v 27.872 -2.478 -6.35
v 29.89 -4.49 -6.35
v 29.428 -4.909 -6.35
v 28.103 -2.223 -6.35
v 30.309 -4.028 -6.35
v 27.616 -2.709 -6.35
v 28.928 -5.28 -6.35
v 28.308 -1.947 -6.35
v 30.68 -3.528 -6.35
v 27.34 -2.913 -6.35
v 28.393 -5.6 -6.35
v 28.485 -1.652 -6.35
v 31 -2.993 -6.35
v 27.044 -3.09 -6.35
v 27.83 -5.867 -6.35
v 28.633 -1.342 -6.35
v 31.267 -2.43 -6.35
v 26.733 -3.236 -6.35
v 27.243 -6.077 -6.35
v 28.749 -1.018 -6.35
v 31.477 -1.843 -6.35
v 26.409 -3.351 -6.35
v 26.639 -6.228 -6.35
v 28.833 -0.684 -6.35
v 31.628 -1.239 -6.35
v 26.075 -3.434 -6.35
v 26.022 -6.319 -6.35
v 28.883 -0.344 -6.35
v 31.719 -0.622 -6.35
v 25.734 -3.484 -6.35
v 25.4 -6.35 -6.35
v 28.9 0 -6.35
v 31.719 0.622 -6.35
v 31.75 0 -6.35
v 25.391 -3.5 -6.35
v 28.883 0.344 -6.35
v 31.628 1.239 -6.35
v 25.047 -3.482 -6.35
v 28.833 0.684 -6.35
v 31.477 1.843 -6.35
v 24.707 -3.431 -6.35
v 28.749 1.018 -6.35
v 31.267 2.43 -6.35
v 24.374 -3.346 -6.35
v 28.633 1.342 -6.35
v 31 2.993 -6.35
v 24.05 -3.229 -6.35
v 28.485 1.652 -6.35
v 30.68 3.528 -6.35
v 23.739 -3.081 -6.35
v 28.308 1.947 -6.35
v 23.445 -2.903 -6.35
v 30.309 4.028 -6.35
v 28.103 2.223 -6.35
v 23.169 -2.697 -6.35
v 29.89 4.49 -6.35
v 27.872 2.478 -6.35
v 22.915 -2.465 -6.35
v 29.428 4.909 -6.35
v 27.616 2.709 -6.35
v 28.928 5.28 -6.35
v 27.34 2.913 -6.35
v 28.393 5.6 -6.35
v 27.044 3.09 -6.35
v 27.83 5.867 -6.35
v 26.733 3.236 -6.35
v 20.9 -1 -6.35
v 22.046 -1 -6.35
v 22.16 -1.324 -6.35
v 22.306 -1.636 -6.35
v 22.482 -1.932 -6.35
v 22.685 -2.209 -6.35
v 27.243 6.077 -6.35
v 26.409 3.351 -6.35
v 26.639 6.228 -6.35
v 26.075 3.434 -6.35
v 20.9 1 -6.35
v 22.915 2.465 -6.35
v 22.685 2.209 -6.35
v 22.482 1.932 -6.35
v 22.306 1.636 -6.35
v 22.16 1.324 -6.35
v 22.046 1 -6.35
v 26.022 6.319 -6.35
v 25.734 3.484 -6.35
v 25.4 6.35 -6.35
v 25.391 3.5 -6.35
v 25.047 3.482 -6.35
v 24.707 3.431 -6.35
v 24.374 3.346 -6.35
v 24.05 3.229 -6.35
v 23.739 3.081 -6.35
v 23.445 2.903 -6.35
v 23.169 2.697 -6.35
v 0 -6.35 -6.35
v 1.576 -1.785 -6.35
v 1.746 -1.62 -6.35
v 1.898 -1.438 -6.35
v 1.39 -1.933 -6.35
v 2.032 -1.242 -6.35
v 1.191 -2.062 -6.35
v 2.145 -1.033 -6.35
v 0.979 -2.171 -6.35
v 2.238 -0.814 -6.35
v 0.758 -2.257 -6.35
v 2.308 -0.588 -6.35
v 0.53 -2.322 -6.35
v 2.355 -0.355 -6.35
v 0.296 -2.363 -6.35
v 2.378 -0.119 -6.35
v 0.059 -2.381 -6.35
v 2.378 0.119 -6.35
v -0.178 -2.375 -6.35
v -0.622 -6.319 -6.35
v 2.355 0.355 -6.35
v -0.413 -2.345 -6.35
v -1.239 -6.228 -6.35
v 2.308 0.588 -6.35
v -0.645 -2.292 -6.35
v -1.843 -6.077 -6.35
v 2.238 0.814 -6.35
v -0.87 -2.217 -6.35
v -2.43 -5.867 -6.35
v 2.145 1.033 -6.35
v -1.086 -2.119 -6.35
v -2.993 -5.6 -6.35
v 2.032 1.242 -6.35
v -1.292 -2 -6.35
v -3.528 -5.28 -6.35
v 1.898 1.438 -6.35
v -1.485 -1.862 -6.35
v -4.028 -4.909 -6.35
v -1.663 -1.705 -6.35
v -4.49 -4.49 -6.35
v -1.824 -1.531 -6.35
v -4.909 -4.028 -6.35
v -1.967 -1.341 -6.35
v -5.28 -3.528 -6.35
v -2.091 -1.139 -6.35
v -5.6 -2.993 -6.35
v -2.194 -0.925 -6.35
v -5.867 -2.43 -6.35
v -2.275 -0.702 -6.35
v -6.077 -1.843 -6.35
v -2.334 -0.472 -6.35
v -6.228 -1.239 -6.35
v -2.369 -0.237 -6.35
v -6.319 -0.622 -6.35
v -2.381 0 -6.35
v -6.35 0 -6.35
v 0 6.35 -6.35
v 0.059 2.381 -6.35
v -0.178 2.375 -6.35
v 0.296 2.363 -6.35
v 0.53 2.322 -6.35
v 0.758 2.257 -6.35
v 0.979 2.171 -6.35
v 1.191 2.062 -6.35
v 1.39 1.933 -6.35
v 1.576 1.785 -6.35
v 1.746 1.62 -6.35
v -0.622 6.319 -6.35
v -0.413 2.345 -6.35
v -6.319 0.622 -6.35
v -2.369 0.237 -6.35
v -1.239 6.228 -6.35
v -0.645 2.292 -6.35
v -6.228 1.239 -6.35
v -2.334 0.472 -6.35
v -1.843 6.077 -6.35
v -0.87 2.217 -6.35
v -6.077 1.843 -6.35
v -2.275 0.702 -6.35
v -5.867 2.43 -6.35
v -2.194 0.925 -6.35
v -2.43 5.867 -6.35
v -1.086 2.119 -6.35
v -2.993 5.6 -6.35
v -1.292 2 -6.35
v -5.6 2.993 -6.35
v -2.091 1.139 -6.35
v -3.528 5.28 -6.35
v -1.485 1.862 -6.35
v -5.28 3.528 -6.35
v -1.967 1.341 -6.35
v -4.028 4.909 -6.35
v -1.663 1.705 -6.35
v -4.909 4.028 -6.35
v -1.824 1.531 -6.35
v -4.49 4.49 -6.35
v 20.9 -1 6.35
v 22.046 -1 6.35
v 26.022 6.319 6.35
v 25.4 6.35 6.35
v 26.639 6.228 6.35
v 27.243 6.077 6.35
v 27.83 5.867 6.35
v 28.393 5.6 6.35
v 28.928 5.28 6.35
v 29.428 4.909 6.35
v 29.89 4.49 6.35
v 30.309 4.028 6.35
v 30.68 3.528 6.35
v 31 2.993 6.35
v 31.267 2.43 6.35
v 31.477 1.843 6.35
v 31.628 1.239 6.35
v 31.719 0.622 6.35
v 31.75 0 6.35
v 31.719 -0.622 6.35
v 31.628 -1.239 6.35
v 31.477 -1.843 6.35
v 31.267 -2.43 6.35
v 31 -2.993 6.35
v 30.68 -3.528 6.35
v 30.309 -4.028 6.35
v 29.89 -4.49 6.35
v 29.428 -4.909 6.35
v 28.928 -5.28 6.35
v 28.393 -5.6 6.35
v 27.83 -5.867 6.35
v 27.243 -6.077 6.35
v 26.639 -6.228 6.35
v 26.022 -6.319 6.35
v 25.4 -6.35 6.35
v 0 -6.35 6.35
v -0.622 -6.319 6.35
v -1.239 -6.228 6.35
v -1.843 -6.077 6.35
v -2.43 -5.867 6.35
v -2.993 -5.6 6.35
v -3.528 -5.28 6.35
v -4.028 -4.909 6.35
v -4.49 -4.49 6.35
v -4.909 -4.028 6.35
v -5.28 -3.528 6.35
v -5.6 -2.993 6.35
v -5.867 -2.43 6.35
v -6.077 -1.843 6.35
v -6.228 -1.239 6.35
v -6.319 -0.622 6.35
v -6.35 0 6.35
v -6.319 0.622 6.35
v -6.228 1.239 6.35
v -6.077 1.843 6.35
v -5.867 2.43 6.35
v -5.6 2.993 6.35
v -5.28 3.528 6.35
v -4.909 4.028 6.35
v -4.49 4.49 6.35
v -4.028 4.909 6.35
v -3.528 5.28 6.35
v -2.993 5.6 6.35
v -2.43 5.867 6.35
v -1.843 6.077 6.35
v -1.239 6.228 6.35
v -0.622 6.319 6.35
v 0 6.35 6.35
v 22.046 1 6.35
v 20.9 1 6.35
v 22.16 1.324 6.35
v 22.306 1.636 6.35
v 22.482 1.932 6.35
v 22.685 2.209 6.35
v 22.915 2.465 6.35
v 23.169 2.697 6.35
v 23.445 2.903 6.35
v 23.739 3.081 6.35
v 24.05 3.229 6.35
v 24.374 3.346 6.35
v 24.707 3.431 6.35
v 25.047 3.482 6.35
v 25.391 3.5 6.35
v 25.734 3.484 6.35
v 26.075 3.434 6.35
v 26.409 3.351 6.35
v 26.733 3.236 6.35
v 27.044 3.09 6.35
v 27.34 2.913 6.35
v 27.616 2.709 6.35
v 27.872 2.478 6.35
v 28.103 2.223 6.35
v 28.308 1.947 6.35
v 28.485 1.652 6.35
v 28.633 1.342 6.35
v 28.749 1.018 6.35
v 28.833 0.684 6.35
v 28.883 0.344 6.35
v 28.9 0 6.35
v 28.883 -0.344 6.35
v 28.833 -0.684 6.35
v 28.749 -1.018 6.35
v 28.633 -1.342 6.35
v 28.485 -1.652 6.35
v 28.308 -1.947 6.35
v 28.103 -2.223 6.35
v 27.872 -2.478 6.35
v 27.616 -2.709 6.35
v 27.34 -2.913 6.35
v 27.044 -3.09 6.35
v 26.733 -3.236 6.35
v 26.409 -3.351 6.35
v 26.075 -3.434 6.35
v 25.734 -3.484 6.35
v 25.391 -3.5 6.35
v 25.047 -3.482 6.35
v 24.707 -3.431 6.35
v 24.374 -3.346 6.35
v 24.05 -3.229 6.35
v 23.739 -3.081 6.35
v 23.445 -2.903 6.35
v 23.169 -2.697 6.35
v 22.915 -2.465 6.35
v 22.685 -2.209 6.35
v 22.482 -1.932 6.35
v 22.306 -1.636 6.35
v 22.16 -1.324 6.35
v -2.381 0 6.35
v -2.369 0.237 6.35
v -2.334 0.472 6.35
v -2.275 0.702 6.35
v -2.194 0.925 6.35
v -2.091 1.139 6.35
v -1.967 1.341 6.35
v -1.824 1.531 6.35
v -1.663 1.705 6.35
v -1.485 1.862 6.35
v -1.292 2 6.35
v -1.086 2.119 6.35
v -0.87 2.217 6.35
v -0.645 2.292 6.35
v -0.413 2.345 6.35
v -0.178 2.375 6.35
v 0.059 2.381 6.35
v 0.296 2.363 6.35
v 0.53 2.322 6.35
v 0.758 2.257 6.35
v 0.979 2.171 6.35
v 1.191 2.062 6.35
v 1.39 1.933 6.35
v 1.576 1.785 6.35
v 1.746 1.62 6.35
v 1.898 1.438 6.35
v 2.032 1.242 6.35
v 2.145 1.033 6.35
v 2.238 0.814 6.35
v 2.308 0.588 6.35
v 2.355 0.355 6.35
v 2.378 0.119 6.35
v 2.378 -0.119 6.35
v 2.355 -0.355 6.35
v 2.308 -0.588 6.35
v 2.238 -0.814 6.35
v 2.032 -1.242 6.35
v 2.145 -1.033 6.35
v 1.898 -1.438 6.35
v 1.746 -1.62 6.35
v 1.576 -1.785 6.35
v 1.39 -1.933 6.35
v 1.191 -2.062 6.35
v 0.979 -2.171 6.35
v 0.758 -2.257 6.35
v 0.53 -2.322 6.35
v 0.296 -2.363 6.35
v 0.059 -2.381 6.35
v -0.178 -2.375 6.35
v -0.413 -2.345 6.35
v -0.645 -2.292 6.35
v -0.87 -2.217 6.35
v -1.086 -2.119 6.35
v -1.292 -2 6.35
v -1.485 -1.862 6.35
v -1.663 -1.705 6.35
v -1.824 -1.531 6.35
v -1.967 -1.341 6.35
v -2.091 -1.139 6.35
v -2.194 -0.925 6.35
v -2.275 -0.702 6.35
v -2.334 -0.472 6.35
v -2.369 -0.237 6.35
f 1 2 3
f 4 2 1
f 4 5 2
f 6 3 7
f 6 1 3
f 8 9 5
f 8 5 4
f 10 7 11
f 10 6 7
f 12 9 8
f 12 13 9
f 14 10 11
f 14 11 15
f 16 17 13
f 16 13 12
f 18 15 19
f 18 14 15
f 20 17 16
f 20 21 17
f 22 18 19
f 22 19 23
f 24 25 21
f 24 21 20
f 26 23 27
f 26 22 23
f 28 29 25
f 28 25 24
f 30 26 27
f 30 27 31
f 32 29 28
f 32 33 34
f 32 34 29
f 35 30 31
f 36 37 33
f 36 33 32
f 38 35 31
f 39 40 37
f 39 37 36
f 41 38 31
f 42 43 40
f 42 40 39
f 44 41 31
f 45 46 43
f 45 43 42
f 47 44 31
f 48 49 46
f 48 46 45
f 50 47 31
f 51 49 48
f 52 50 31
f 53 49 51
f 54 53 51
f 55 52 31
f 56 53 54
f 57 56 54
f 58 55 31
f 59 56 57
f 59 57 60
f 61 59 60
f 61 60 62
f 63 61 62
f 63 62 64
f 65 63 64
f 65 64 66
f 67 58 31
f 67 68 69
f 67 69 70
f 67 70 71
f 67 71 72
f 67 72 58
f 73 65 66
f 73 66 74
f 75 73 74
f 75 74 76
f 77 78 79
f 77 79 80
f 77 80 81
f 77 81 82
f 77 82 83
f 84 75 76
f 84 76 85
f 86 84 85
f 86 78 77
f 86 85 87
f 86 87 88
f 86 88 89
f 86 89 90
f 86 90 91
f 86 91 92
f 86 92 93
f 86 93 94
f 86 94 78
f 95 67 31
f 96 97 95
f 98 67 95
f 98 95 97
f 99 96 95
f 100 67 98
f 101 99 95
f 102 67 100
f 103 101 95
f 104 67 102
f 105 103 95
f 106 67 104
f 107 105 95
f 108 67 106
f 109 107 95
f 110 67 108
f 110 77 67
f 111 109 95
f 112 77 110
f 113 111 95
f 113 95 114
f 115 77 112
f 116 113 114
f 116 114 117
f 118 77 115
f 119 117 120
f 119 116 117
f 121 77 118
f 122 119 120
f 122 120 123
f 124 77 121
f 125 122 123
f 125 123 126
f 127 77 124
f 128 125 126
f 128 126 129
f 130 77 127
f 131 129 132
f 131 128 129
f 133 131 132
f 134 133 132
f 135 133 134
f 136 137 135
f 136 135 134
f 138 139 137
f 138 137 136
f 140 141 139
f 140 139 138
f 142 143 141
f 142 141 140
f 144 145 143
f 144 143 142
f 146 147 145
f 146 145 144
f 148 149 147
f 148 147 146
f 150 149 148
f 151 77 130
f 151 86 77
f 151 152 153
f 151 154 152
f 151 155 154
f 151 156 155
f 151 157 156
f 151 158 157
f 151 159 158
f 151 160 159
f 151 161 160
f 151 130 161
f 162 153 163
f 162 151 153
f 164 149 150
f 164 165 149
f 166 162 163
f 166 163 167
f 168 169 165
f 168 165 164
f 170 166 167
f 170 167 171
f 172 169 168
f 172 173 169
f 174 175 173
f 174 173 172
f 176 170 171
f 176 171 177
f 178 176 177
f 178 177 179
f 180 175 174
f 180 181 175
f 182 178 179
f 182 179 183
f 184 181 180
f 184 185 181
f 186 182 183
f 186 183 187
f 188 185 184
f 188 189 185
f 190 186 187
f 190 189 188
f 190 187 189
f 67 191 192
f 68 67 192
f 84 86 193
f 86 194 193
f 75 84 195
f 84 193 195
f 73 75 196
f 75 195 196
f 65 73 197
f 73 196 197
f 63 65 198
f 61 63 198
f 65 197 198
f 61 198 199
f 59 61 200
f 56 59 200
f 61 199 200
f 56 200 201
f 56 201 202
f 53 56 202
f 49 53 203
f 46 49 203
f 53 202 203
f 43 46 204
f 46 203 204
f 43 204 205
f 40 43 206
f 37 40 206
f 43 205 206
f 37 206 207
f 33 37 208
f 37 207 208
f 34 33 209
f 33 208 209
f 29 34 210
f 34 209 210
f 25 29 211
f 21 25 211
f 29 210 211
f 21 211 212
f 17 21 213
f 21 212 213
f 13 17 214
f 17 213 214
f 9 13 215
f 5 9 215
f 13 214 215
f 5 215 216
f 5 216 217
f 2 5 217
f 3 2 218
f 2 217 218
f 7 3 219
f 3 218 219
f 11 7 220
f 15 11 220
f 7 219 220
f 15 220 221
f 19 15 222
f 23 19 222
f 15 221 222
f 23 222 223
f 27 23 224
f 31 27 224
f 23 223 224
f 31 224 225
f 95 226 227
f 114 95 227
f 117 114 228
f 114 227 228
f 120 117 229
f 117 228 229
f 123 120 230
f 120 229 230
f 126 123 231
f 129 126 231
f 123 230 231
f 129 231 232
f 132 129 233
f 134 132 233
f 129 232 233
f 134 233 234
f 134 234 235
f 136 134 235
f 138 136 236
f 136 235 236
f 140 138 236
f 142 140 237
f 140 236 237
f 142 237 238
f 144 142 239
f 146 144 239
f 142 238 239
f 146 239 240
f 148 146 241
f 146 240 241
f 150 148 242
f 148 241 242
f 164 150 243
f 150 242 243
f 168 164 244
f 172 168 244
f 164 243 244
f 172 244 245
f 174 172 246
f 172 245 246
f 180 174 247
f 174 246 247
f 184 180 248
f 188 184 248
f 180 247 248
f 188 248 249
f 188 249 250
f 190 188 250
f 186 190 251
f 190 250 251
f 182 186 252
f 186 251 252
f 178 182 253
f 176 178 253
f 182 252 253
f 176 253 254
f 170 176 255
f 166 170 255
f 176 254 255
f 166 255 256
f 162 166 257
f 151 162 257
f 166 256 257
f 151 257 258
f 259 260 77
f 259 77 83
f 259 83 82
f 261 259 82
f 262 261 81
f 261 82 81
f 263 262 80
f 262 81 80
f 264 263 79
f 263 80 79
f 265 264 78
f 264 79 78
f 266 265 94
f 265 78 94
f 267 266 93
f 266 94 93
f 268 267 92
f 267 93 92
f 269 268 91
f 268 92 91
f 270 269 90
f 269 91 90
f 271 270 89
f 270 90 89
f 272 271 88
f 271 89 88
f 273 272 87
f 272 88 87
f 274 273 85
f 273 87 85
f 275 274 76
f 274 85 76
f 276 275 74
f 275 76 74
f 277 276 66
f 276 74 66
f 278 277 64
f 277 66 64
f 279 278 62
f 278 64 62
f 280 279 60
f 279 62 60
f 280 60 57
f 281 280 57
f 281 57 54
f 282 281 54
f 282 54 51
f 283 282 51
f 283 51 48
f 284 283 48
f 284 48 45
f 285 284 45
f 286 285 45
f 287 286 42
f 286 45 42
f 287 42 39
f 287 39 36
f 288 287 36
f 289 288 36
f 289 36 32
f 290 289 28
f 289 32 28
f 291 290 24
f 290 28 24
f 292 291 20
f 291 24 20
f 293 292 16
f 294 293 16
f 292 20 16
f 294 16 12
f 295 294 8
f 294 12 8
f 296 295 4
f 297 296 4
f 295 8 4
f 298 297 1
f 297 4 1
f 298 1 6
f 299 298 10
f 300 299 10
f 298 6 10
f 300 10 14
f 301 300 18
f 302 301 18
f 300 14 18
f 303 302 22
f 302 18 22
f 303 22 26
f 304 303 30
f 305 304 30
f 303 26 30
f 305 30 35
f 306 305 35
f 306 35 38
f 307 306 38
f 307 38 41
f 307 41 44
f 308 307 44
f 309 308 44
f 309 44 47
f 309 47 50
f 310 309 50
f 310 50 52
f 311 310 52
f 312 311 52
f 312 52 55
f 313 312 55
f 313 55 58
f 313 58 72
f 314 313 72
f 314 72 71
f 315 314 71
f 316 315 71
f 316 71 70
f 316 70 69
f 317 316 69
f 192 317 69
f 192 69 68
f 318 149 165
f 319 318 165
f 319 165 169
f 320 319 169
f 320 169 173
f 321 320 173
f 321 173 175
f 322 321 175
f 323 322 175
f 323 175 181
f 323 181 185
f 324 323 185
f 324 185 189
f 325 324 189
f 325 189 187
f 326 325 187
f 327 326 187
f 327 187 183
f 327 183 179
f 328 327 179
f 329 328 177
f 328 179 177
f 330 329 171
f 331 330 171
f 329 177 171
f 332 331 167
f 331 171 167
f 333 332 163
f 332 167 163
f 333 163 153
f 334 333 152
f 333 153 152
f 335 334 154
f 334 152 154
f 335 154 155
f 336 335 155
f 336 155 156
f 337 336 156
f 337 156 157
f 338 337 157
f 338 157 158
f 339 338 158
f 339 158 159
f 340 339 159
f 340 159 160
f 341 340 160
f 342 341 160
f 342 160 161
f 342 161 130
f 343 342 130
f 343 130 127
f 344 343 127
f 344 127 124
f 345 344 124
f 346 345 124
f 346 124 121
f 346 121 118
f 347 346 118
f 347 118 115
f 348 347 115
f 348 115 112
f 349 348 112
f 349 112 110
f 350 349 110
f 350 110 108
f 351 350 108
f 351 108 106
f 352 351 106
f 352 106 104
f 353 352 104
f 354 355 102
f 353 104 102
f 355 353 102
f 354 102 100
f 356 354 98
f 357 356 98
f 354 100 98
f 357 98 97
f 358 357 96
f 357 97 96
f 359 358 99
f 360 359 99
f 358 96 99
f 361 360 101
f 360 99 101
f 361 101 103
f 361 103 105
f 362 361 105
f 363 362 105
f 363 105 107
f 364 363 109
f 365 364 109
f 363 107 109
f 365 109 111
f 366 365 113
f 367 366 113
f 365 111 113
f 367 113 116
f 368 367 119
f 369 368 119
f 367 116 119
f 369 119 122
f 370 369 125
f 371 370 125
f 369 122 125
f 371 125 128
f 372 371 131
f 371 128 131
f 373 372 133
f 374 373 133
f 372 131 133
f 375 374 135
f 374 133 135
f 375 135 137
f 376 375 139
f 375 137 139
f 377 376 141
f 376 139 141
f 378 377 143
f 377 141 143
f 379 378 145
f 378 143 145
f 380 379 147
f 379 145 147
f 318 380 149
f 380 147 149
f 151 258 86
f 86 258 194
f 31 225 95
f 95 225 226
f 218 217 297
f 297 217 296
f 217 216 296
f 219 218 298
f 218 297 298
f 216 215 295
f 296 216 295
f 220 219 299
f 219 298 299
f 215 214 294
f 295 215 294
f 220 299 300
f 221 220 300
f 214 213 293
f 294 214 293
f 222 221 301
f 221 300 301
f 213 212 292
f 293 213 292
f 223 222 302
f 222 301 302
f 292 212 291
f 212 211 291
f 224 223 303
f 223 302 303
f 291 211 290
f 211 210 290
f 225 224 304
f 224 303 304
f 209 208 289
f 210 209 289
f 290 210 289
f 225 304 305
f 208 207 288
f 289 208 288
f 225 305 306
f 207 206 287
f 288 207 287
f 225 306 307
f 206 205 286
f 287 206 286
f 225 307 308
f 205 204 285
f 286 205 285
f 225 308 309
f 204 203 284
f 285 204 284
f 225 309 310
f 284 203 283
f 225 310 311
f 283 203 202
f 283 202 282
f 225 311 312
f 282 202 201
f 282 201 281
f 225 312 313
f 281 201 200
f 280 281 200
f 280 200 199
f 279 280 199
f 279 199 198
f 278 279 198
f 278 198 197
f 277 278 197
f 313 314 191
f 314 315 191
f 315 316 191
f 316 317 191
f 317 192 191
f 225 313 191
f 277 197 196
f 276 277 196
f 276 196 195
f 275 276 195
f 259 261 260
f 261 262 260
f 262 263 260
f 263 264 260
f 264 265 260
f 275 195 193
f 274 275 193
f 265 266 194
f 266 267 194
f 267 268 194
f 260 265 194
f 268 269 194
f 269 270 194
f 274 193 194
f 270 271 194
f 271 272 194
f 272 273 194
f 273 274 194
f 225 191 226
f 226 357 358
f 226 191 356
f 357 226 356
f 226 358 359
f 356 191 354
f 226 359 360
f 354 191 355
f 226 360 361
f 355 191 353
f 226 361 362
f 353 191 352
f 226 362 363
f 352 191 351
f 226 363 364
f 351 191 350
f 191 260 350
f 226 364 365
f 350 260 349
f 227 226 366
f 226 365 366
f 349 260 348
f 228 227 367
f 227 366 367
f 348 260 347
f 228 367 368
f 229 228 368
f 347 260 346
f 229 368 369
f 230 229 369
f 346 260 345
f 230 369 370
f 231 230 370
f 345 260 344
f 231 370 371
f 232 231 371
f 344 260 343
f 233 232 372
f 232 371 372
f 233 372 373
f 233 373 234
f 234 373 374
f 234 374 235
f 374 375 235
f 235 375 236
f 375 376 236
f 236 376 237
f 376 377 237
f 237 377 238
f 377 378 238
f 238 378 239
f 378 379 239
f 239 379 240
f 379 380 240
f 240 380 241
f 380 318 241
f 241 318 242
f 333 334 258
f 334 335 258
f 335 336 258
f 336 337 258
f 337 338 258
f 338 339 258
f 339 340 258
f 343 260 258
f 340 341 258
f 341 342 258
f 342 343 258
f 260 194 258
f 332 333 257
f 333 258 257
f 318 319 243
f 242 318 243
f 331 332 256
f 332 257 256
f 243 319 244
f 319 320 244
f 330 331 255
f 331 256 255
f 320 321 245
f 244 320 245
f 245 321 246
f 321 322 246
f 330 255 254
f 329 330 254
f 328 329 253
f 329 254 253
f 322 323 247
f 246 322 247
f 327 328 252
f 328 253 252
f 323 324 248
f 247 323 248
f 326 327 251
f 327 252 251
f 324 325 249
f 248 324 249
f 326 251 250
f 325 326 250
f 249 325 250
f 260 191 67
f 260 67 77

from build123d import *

# Parameters (mm, degrees)
MAIN_BODY_DEPTH                = 6.35
F_3_16_0_1875_DIAMETER_HOLE1_D = 4.7625
F_7_0_7_DIAMETER_HOLE1_D       = 7
F_7_0_7_DIAMETER_HOLE1_DEPTH   = 12.7
F_7_0_7_DIAMETER_HOLE1_TIP     = 2.103012167
SKETCH6_W                      = 2.5
SKETCH6_H                      = 2
CUT_2X2_KEYWAY_DEPTH           = 35.780382402


with BuildPart() as part:
    # Sketch1 → Main Body (new, symmetric)
    with BuildSketch(Plane.XY):
        with BuildLine():
            Line((0, 6.35), (25.4, 6.35))
            ThreePointArc((25.4, 6.35), (31.75, 0), (25.4, -6.35))
            Line((25.4, -6.35), (0, -6.35))
            ThreePointArc((0, -6.35), (-6.35, 0), (0, 6.35))
        make_face()
    extrude(amount=MAIN_BODY_DEPTH, both=True)

    # 3/16 (0.1875) Diameter Hole1 (through all)
    with Locations(Plane.XY.offset(6.35)):
        with Locations((0, 0)):
            Hole(F_3_16_0_1875_DIAMETER_HOLE1_D / 2)

    # Ø7.0 (7) Diameter Hole1
    with Locations(Plane.XY.offset(6.35)):
        with Locations((25.4, 0)):
            Hole(F_7_0_7_DIAMETER_HOLE1_D / 2, depth=F_7_0_7_DIAMETER_HOLE1_DEPTH)
            with Locations((0, 0, -(F_7_0_7_DIAMETER_HOLE1_DEPTH + F_7_0_7_DIAMETER_HOLE1_TIP / 2))):  # 118° drill point
                Cone(0, F_7_0_7_DIAMETER_HOLE1_D / 2, F_7_0_7_DIAMETER_HOLE1_TIP, mode=Mode.SUBTRACT)

    # Sketch6 → Cut-2x2 Keyway (cut, through all)
    with BuildSketch(Plane.XY.offset(6.35)):
        with Locations((22.15, 0)):
            Rectangle(SKETCH6_W, SKETCH6_H)
    extrude(amount=-CUT_2X2_KEYWAY_DEPTH, mode=Mode.SUBTRACT)


solid = part.part
